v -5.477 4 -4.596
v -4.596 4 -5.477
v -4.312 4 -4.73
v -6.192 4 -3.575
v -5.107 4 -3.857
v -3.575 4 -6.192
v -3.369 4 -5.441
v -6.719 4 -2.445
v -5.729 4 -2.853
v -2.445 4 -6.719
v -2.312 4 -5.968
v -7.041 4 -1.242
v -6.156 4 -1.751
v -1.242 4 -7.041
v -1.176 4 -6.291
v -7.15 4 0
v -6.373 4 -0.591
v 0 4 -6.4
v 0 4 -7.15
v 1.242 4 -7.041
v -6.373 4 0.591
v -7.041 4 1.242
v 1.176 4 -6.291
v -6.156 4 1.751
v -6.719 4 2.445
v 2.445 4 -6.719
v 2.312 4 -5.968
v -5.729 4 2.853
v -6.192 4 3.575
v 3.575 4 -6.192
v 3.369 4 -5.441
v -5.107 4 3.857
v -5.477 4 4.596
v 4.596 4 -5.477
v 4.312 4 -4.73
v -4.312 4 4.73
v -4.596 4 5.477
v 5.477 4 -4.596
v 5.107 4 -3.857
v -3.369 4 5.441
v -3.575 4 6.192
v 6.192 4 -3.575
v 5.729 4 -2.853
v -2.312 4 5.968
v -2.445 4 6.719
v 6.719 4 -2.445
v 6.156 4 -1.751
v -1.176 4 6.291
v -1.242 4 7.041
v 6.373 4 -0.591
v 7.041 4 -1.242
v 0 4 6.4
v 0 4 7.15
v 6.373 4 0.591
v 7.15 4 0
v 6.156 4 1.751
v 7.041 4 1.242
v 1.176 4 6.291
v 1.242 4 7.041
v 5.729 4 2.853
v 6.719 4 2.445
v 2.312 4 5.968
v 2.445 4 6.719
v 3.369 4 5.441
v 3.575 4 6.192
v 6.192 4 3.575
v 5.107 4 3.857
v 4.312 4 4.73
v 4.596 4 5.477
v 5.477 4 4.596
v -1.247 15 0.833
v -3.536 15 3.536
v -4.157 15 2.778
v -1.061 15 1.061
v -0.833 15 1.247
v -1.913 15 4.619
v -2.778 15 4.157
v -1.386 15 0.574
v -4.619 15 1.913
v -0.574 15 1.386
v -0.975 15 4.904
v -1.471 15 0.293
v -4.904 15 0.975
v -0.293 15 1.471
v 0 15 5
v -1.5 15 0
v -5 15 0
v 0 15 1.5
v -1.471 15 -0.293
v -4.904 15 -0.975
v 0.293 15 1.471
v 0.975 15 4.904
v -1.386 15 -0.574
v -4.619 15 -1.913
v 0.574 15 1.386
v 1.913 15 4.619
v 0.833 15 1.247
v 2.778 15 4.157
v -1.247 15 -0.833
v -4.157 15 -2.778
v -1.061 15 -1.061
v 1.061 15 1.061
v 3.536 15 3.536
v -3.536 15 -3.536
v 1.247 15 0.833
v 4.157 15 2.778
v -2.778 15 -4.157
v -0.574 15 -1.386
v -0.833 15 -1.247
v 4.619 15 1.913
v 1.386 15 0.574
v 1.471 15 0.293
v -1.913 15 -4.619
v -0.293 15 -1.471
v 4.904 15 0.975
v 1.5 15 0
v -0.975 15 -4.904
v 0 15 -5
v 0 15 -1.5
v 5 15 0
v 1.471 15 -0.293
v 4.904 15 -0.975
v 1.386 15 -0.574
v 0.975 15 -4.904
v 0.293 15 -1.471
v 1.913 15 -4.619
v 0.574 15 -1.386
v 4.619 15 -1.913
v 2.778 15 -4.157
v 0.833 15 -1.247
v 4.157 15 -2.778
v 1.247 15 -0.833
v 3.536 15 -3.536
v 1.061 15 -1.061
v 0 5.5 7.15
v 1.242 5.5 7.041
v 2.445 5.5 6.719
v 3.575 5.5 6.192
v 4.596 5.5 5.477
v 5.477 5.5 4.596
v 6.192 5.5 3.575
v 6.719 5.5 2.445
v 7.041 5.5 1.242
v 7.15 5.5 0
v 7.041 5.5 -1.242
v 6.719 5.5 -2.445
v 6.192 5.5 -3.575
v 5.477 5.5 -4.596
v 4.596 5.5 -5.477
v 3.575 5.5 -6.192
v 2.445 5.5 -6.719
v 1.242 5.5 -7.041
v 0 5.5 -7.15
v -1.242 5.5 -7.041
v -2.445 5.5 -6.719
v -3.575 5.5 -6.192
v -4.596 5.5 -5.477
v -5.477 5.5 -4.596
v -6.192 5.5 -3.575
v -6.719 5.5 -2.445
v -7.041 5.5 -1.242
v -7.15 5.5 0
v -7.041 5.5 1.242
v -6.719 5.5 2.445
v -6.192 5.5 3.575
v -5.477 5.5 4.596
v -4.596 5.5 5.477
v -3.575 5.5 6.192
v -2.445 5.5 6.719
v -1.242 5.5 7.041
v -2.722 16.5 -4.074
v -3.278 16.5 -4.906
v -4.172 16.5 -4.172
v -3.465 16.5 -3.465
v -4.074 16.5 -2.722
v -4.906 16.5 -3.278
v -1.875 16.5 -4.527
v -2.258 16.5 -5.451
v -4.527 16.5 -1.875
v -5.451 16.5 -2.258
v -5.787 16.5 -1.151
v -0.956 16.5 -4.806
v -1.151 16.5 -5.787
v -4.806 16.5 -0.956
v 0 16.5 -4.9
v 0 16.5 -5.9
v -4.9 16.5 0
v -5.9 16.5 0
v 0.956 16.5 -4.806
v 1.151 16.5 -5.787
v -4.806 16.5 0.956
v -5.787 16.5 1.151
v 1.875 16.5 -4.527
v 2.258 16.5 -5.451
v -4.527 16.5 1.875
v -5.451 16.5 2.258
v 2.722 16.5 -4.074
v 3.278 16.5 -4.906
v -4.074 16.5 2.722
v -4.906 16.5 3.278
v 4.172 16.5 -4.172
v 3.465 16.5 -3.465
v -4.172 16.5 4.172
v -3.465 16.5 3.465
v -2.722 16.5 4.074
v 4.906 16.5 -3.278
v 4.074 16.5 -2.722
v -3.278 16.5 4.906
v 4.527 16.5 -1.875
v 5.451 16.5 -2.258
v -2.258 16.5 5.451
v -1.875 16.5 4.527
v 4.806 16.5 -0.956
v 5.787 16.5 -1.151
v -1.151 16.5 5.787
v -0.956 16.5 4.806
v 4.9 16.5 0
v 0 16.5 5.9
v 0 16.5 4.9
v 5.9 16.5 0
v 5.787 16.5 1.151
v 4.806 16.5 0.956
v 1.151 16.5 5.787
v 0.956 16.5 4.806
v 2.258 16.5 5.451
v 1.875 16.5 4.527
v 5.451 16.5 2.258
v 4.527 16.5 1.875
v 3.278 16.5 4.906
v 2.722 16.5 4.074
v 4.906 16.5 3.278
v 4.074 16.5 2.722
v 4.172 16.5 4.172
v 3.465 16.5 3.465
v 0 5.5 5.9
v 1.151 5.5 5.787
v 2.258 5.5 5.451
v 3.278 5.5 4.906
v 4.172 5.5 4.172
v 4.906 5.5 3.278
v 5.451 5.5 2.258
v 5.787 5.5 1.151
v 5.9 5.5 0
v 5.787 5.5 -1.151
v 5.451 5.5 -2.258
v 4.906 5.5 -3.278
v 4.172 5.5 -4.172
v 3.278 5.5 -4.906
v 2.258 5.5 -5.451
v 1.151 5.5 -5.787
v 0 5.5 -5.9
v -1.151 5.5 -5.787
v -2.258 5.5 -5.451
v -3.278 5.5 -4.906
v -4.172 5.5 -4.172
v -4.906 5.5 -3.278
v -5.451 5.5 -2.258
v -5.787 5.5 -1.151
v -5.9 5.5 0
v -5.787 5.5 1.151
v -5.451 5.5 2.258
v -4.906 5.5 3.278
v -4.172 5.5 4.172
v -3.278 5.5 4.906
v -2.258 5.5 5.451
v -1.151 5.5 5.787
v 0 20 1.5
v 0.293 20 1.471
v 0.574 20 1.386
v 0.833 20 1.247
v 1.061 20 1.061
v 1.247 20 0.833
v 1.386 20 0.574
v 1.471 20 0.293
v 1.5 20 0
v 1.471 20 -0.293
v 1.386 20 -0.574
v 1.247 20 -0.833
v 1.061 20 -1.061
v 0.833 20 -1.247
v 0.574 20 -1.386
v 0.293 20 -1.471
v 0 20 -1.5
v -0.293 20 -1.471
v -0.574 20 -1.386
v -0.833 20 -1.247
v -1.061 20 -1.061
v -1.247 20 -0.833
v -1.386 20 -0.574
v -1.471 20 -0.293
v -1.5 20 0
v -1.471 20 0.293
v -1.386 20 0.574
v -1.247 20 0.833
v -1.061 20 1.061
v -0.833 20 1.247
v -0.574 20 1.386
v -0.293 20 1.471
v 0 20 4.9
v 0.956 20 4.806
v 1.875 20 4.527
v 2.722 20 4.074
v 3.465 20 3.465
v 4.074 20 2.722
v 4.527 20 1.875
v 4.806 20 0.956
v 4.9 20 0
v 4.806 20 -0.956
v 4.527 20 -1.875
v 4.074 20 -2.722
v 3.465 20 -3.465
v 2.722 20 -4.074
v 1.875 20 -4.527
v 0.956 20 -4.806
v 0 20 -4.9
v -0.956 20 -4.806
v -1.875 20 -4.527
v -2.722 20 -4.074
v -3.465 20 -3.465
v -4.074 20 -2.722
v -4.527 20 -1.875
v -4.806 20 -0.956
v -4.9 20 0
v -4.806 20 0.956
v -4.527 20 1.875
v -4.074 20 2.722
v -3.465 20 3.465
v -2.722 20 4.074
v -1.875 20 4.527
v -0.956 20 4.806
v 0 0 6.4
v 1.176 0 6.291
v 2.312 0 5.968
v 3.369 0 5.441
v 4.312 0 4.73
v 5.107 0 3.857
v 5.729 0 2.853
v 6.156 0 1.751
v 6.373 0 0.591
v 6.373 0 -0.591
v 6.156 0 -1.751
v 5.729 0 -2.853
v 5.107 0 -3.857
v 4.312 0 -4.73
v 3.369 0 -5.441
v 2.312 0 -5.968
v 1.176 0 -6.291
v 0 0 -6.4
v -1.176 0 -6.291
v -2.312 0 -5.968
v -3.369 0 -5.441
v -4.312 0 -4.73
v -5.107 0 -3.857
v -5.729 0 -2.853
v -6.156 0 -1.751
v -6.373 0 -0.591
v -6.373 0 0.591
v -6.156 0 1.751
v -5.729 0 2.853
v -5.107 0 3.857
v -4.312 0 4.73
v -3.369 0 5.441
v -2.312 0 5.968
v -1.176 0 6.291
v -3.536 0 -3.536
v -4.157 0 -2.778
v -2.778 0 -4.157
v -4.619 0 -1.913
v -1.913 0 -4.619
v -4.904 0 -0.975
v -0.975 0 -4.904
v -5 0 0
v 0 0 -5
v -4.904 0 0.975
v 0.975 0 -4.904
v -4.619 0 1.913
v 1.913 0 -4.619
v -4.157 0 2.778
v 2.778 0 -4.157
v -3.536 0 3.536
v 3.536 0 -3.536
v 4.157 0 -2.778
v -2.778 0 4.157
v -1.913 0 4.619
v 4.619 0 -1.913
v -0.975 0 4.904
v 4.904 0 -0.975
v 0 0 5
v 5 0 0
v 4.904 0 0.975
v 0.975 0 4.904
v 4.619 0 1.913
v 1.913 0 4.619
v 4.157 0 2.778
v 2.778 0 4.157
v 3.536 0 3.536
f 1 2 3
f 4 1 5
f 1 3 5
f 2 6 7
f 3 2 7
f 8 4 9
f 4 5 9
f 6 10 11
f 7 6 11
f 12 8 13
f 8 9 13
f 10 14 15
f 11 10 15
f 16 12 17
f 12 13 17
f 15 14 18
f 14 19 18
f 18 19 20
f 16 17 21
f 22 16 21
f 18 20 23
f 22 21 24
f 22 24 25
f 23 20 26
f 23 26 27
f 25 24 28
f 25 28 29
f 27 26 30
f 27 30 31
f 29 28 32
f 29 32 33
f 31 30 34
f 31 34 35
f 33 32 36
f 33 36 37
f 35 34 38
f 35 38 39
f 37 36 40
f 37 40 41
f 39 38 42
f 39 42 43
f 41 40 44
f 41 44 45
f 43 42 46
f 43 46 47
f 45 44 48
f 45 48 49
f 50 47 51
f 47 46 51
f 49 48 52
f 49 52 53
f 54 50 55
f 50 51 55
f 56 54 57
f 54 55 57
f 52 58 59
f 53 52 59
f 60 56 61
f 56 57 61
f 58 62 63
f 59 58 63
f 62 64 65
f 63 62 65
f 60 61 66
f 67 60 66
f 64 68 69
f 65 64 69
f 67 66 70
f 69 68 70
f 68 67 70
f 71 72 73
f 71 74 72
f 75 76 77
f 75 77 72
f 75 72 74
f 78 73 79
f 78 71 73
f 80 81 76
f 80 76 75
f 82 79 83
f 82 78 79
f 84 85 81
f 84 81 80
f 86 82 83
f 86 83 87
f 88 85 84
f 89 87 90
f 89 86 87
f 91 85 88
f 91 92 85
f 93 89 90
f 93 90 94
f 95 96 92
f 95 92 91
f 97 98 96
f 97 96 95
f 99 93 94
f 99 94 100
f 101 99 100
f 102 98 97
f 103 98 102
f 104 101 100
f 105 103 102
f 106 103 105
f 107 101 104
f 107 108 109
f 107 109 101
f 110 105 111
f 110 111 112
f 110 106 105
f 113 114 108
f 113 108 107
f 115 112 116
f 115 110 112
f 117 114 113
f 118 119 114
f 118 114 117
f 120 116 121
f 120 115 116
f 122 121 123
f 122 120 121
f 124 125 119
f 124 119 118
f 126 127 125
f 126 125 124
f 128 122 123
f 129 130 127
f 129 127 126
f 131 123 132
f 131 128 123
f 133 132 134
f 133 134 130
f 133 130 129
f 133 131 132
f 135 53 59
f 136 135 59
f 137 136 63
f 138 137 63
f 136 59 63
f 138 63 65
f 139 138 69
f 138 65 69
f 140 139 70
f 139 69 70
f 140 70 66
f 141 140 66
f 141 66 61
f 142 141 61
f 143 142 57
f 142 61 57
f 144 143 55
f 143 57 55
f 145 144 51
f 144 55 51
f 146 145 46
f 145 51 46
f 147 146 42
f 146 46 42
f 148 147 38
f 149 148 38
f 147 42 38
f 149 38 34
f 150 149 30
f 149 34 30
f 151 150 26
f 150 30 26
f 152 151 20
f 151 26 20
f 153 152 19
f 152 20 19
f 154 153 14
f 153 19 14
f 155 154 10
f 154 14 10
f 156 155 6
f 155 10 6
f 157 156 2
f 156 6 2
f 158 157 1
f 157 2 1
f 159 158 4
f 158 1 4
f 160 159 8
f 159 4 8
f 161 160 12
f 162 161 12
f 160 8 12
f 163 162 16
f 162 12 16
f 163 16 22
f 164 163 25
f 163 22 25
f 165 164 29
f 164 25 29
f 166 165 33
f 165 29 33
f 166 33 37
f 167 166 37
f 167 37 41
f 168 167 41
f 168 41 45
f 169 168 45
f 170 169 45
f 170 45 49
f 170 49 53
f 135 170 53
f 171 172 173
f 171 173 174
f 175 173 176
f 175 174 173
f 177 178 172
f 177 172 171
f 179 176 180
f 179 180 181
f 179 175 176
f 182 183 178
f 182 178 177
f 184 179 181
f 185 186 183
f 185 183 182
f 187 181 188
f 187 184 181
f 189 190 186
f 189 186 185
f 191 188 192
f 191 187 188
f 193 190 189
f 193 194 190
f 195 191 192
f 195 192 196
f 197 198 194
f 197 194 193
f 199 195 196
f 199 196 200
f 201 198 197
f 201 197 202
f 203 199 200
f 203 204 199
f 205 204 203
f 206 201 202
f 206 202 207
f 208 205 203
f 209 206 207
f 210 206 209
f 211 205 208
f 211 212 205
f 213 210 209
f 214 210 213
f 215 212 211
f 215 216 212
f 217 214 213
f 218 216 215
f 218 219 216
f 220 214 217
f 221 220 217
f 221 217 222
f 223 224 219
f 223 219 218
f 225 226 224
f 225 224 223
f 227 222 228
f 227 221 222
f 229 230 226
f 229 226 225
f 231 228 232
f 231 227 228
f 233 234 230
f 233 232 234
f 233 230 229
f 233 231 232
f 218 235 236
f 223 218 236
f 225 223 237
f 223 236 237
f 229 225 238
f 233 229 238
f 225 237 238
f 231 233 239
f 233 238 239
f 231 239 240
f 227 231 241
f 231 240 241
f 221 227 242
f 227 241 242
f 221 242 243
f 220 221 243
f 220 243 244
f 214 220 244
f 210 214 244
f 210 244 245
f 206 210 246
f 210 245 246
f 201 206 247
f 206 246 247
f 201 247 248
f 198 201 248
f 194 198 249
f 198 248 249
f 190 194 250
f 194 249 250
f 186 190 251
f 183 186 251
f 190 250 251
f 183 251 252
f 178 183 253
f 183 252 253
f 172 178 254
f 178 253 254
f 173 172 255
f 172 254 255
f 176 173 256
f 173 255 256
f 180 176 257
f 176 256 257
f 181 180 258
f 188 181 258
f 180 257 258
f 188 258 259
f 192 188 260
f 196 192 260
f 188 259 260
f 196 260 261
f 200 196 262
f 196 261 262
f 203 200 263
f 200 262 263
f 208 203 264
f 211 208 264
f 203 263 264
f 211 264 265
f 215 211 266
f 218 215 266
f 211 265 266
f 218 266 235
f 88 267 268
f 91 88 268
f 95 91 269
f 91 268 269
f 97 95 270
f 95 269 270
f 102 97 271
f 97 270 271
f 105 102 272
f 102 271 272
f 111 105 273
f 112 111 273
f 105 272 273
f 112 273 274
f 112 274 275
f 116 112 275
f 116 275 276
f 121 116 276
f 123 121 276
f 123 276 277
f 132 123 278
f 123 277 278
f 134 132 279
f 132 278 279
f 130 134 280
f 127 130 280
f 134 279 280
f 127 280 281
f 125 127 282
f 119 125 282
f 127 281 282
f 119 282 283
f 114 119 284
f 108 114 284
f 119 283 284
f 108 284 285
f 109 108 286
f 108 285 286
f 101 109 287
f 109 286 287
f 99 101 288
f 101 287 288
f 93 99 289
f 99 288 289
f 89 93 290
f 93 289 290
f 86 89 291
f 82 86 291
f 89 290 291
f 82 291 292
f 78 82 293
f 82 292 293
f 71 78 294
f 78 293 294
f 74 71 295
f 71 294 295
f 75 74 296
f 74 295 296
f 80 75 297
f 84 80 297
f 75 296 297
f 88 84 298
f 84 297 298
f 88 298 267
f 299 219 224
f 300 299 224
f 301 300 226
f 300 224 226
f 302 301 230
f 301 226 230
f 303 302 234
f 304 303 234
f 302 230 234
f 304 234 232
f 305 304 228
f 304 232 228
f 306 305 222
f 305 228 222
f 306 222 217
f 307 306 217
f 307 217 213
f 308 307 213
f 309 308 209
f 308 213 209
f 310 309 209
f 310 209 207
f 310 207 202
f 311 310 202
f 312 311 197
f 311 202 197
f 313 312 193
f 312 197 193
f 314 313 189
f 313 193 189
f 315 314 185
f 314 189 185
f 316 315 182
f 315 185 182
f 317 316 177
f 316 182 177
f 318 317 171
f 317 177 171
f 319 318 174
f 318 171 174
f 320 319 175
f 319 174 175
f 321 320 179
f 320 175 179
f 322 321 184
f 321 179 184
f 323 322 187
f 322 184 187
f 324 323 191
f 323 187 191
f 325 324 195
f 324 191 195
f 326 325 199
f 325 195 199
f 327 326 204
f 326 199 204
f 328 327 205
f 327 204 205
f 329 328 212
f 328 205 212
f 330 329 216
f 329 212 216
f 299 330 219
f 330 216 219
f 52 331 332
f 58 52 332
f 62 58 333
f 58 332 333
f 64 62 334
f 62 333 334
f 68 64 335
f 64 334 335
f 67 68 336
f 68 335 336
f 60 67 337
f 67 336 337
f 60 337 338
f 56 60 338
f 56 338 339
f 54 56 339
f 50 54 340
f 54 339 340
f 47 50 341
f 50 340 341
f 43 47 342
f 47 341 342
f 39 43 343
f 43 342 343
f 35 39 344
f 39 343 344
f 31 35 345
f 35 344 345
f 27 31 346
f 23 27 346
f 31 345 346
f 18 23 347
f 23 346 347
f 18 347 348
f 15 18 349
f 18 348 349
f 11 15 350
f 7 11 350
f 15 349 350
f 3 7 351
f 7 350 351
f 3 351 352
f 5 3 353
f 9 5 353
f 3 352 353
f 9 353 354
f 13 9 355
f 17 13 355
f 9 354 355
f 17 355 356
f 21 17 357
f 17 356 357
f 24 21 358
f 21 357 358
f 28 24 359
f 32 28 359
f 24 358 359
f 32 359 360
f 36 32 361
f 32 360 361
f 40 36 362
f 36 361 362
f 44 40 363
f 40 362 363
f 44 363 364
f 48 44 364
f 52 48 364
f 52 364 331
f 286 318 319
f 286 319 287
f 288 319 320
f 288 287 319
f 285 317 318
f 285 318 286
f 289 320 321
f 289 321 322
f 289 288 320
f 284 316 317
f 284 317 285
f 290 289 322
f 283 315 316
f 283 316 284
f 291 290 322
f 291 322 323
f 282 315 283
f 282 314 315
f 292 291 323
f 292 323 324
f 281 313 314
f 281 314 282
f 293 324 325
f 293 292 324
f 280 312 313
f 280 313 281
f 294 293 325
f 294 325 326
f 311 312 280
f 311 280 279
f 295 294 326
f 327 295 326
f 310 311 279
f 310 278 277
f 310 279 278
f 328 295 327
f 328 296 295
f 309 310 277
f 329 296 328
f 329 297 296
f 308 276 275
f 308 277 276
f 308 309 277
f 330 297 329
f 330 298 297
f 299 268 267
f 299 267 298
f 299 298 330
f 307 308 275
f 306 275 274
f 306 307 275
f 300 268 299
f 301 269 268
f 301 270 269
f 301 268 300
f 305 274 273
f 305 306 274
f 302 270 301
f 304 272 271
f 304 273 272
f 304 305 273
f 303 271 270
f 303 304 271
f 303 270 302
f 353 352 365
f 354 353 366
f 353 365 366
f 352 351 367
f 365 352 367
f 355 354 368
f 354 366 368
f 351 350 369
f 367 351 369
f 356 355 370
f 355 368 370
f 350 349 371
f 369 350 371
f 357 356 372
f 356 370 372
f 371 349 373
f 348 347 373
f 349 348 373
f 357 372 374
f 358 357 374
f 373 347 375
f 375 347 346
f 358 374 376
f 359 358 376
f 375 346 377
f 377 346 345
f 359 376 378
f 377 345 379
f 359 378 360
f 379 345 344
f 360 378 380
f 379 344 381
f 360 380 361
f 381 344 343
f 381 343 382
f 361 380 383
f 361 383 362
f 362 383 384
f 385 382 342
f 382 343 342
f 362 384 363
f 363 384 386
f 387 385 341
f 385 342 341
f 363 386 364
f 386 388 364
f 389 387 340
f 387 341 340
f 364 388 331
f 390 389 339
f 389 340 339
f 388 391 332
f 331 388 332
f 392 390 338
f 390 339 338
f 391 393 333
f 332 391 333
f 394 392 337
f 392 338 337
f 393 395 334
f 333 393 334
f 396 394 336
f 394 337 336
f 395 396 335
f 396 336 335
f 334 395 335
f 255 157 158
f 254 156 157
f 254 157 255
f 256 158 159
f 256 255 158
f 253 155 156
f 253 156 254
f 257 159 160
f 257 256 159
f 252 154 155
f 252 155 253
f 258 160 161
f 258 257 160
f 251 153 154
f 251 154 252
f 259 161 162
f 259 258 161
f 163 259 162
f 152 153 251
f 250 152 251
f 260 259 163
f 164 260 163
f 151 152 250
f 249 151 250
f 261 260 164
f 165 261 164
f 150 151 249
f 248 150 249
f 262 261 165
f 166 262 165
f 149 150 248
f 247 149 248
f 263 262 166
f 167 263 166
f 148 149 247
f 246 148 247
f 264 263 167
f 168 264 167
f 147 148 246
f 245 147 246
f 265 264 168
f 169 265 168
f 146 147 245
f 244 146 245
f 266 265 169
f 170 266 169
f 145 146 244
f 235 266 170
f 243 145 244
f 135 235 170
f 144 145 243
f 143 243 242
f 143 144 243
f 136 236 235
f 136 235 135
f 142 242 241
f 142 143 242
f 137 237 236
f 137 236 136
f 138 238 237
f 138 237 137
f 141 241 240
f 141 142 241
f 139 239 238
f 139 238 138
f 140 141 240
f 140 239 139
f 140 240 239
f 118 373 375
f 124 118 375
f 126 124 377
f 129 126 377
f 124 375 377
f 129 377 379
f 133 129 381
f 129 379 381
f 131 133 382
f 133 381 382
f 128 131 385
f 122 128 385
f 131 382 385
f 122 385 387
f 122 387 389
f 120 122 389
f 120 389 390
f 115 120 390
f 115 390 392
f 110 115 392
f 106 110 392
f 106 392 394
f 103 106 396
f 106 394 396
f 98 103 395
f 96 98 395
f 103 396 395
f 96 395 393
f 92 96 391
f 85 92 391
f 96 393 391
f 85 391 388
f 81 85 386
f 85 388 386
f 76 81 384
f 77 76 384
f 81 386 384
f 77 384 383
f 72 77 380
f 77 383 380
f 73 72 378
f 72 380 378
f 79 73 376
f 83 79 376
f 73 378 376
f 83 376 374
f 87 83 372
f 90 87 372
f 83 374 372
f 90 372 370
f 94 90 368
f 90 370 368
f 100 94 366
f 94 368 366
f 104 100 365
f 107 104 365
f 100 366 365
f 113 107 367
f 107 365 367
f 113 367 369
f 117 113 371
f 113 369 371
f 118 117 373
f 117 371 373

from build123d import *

# Parameters (mm, degrees)
SKETCH_1_R          = 6.4
EXTRUDE_1_DEPTH     = 4
SKETCH_2_R          = 7.15
EXTRUDE_2_DEPTH     = 1.5
SKETCH_3_R          = 5.9
EXTRUDE_3_DEPTH     = 11
SKETCH_4_R          = 4.9
EXTRUDE_4_DEPTH     = 3.5
SKETCH_5_R          = 5
CUT_EXTRUDE_1_DEPTH = 15
SKETCH_6_R          = 1.5
CUT_EXTRUDE_2_DEPTH = 5


with BuildPart() as part:
    # ｽｹｯﾁ1 → ﾎﾞｽ - 押し出し1 (new body)
    with BuildSketch(Plane(origin=(0, 0, 0), x_dir=(1, 0, 0), z_dir=(0, 1, 0))):
        with Locations(Location((0, 0, 0), (0, 0, 270))):
            Circle(SKETCH_1_R)
    extrude(amount=EXTRUDE_1_DEPTH)

    # ｽｹｯﾁ2 → ﾎﾞｽ - 押し出し2 (add)
    with BuildSketch(Plane(origin=(0, 4, 0), x_dir=(1, 0, 0), z_dir=(0, 1, 0))):
        with Locations(Location((0, 0, 0), (0, 0, 270))):
            Circle(SKETCH_2_R)
    extrude(amount=EXTRUDE_2_DEPTH)

    # ｽｹｯﾁ3 → ﾎﾞｽ - 押し出し3 (add)
    with BuildSketch(Plane(origin=(0, 5.5, 0), x_dir=(1, 0, 0), z_dir=(0, 1, 0))):
        with Locations(Location((0, 0, 0), (0, 0, 270))):
            Circle(SKETCH_3_R)
    extrude(amount=EXTRUDE_3_DEPTH)

    # ｽｹｯﾁ4 → ﾎﾞｽ - 押し出し4 (add)
    with BuildSketch(Plane(origin=(0, 16.5, 0), x_dir=(1, 0, 0), z_dir=(0, 1, 0))):
        with Locations(Location((0, 0, 0), (0, 0, 270))):
            Circle(SKETCH_4_R)
    extrude(amount=EXTRUDE_4_DEPTH)

    # ｽｹｯﾁ5 → ｶｯﾄ - 押し出し1 (cut)
    with BuildSketch(Plane(origin=(0, 0, 0), x_dir=(-1, 0, 0), z_dir=(0, -1, 0))):
        with Locations(Location((0, 0, 0), (0, 0, 90))):
            Circle(SKETCH_5_R)
    extrude(amount=-CUT_EXTRUDE_1_DEPTH, mode=Mode.SUBTRACT)

    # ｽｹｯﾁ6 → ｶｯﾄ - 押し出し2 (cut)
    with BuildSketch(Plane(origin=(0, 20, 0), x_dir=(1, 0, 0), z_dir=(0, 1, 0))):
        with Locations(Location((0, 0, 0), (0, 0, 270))):
            Circle(SKETCH_6_R)
    extrude(amount=-CUT_EXTRUDE_2_DEPTH, mode=Mode.SUBTRACT)


solid = part.part
